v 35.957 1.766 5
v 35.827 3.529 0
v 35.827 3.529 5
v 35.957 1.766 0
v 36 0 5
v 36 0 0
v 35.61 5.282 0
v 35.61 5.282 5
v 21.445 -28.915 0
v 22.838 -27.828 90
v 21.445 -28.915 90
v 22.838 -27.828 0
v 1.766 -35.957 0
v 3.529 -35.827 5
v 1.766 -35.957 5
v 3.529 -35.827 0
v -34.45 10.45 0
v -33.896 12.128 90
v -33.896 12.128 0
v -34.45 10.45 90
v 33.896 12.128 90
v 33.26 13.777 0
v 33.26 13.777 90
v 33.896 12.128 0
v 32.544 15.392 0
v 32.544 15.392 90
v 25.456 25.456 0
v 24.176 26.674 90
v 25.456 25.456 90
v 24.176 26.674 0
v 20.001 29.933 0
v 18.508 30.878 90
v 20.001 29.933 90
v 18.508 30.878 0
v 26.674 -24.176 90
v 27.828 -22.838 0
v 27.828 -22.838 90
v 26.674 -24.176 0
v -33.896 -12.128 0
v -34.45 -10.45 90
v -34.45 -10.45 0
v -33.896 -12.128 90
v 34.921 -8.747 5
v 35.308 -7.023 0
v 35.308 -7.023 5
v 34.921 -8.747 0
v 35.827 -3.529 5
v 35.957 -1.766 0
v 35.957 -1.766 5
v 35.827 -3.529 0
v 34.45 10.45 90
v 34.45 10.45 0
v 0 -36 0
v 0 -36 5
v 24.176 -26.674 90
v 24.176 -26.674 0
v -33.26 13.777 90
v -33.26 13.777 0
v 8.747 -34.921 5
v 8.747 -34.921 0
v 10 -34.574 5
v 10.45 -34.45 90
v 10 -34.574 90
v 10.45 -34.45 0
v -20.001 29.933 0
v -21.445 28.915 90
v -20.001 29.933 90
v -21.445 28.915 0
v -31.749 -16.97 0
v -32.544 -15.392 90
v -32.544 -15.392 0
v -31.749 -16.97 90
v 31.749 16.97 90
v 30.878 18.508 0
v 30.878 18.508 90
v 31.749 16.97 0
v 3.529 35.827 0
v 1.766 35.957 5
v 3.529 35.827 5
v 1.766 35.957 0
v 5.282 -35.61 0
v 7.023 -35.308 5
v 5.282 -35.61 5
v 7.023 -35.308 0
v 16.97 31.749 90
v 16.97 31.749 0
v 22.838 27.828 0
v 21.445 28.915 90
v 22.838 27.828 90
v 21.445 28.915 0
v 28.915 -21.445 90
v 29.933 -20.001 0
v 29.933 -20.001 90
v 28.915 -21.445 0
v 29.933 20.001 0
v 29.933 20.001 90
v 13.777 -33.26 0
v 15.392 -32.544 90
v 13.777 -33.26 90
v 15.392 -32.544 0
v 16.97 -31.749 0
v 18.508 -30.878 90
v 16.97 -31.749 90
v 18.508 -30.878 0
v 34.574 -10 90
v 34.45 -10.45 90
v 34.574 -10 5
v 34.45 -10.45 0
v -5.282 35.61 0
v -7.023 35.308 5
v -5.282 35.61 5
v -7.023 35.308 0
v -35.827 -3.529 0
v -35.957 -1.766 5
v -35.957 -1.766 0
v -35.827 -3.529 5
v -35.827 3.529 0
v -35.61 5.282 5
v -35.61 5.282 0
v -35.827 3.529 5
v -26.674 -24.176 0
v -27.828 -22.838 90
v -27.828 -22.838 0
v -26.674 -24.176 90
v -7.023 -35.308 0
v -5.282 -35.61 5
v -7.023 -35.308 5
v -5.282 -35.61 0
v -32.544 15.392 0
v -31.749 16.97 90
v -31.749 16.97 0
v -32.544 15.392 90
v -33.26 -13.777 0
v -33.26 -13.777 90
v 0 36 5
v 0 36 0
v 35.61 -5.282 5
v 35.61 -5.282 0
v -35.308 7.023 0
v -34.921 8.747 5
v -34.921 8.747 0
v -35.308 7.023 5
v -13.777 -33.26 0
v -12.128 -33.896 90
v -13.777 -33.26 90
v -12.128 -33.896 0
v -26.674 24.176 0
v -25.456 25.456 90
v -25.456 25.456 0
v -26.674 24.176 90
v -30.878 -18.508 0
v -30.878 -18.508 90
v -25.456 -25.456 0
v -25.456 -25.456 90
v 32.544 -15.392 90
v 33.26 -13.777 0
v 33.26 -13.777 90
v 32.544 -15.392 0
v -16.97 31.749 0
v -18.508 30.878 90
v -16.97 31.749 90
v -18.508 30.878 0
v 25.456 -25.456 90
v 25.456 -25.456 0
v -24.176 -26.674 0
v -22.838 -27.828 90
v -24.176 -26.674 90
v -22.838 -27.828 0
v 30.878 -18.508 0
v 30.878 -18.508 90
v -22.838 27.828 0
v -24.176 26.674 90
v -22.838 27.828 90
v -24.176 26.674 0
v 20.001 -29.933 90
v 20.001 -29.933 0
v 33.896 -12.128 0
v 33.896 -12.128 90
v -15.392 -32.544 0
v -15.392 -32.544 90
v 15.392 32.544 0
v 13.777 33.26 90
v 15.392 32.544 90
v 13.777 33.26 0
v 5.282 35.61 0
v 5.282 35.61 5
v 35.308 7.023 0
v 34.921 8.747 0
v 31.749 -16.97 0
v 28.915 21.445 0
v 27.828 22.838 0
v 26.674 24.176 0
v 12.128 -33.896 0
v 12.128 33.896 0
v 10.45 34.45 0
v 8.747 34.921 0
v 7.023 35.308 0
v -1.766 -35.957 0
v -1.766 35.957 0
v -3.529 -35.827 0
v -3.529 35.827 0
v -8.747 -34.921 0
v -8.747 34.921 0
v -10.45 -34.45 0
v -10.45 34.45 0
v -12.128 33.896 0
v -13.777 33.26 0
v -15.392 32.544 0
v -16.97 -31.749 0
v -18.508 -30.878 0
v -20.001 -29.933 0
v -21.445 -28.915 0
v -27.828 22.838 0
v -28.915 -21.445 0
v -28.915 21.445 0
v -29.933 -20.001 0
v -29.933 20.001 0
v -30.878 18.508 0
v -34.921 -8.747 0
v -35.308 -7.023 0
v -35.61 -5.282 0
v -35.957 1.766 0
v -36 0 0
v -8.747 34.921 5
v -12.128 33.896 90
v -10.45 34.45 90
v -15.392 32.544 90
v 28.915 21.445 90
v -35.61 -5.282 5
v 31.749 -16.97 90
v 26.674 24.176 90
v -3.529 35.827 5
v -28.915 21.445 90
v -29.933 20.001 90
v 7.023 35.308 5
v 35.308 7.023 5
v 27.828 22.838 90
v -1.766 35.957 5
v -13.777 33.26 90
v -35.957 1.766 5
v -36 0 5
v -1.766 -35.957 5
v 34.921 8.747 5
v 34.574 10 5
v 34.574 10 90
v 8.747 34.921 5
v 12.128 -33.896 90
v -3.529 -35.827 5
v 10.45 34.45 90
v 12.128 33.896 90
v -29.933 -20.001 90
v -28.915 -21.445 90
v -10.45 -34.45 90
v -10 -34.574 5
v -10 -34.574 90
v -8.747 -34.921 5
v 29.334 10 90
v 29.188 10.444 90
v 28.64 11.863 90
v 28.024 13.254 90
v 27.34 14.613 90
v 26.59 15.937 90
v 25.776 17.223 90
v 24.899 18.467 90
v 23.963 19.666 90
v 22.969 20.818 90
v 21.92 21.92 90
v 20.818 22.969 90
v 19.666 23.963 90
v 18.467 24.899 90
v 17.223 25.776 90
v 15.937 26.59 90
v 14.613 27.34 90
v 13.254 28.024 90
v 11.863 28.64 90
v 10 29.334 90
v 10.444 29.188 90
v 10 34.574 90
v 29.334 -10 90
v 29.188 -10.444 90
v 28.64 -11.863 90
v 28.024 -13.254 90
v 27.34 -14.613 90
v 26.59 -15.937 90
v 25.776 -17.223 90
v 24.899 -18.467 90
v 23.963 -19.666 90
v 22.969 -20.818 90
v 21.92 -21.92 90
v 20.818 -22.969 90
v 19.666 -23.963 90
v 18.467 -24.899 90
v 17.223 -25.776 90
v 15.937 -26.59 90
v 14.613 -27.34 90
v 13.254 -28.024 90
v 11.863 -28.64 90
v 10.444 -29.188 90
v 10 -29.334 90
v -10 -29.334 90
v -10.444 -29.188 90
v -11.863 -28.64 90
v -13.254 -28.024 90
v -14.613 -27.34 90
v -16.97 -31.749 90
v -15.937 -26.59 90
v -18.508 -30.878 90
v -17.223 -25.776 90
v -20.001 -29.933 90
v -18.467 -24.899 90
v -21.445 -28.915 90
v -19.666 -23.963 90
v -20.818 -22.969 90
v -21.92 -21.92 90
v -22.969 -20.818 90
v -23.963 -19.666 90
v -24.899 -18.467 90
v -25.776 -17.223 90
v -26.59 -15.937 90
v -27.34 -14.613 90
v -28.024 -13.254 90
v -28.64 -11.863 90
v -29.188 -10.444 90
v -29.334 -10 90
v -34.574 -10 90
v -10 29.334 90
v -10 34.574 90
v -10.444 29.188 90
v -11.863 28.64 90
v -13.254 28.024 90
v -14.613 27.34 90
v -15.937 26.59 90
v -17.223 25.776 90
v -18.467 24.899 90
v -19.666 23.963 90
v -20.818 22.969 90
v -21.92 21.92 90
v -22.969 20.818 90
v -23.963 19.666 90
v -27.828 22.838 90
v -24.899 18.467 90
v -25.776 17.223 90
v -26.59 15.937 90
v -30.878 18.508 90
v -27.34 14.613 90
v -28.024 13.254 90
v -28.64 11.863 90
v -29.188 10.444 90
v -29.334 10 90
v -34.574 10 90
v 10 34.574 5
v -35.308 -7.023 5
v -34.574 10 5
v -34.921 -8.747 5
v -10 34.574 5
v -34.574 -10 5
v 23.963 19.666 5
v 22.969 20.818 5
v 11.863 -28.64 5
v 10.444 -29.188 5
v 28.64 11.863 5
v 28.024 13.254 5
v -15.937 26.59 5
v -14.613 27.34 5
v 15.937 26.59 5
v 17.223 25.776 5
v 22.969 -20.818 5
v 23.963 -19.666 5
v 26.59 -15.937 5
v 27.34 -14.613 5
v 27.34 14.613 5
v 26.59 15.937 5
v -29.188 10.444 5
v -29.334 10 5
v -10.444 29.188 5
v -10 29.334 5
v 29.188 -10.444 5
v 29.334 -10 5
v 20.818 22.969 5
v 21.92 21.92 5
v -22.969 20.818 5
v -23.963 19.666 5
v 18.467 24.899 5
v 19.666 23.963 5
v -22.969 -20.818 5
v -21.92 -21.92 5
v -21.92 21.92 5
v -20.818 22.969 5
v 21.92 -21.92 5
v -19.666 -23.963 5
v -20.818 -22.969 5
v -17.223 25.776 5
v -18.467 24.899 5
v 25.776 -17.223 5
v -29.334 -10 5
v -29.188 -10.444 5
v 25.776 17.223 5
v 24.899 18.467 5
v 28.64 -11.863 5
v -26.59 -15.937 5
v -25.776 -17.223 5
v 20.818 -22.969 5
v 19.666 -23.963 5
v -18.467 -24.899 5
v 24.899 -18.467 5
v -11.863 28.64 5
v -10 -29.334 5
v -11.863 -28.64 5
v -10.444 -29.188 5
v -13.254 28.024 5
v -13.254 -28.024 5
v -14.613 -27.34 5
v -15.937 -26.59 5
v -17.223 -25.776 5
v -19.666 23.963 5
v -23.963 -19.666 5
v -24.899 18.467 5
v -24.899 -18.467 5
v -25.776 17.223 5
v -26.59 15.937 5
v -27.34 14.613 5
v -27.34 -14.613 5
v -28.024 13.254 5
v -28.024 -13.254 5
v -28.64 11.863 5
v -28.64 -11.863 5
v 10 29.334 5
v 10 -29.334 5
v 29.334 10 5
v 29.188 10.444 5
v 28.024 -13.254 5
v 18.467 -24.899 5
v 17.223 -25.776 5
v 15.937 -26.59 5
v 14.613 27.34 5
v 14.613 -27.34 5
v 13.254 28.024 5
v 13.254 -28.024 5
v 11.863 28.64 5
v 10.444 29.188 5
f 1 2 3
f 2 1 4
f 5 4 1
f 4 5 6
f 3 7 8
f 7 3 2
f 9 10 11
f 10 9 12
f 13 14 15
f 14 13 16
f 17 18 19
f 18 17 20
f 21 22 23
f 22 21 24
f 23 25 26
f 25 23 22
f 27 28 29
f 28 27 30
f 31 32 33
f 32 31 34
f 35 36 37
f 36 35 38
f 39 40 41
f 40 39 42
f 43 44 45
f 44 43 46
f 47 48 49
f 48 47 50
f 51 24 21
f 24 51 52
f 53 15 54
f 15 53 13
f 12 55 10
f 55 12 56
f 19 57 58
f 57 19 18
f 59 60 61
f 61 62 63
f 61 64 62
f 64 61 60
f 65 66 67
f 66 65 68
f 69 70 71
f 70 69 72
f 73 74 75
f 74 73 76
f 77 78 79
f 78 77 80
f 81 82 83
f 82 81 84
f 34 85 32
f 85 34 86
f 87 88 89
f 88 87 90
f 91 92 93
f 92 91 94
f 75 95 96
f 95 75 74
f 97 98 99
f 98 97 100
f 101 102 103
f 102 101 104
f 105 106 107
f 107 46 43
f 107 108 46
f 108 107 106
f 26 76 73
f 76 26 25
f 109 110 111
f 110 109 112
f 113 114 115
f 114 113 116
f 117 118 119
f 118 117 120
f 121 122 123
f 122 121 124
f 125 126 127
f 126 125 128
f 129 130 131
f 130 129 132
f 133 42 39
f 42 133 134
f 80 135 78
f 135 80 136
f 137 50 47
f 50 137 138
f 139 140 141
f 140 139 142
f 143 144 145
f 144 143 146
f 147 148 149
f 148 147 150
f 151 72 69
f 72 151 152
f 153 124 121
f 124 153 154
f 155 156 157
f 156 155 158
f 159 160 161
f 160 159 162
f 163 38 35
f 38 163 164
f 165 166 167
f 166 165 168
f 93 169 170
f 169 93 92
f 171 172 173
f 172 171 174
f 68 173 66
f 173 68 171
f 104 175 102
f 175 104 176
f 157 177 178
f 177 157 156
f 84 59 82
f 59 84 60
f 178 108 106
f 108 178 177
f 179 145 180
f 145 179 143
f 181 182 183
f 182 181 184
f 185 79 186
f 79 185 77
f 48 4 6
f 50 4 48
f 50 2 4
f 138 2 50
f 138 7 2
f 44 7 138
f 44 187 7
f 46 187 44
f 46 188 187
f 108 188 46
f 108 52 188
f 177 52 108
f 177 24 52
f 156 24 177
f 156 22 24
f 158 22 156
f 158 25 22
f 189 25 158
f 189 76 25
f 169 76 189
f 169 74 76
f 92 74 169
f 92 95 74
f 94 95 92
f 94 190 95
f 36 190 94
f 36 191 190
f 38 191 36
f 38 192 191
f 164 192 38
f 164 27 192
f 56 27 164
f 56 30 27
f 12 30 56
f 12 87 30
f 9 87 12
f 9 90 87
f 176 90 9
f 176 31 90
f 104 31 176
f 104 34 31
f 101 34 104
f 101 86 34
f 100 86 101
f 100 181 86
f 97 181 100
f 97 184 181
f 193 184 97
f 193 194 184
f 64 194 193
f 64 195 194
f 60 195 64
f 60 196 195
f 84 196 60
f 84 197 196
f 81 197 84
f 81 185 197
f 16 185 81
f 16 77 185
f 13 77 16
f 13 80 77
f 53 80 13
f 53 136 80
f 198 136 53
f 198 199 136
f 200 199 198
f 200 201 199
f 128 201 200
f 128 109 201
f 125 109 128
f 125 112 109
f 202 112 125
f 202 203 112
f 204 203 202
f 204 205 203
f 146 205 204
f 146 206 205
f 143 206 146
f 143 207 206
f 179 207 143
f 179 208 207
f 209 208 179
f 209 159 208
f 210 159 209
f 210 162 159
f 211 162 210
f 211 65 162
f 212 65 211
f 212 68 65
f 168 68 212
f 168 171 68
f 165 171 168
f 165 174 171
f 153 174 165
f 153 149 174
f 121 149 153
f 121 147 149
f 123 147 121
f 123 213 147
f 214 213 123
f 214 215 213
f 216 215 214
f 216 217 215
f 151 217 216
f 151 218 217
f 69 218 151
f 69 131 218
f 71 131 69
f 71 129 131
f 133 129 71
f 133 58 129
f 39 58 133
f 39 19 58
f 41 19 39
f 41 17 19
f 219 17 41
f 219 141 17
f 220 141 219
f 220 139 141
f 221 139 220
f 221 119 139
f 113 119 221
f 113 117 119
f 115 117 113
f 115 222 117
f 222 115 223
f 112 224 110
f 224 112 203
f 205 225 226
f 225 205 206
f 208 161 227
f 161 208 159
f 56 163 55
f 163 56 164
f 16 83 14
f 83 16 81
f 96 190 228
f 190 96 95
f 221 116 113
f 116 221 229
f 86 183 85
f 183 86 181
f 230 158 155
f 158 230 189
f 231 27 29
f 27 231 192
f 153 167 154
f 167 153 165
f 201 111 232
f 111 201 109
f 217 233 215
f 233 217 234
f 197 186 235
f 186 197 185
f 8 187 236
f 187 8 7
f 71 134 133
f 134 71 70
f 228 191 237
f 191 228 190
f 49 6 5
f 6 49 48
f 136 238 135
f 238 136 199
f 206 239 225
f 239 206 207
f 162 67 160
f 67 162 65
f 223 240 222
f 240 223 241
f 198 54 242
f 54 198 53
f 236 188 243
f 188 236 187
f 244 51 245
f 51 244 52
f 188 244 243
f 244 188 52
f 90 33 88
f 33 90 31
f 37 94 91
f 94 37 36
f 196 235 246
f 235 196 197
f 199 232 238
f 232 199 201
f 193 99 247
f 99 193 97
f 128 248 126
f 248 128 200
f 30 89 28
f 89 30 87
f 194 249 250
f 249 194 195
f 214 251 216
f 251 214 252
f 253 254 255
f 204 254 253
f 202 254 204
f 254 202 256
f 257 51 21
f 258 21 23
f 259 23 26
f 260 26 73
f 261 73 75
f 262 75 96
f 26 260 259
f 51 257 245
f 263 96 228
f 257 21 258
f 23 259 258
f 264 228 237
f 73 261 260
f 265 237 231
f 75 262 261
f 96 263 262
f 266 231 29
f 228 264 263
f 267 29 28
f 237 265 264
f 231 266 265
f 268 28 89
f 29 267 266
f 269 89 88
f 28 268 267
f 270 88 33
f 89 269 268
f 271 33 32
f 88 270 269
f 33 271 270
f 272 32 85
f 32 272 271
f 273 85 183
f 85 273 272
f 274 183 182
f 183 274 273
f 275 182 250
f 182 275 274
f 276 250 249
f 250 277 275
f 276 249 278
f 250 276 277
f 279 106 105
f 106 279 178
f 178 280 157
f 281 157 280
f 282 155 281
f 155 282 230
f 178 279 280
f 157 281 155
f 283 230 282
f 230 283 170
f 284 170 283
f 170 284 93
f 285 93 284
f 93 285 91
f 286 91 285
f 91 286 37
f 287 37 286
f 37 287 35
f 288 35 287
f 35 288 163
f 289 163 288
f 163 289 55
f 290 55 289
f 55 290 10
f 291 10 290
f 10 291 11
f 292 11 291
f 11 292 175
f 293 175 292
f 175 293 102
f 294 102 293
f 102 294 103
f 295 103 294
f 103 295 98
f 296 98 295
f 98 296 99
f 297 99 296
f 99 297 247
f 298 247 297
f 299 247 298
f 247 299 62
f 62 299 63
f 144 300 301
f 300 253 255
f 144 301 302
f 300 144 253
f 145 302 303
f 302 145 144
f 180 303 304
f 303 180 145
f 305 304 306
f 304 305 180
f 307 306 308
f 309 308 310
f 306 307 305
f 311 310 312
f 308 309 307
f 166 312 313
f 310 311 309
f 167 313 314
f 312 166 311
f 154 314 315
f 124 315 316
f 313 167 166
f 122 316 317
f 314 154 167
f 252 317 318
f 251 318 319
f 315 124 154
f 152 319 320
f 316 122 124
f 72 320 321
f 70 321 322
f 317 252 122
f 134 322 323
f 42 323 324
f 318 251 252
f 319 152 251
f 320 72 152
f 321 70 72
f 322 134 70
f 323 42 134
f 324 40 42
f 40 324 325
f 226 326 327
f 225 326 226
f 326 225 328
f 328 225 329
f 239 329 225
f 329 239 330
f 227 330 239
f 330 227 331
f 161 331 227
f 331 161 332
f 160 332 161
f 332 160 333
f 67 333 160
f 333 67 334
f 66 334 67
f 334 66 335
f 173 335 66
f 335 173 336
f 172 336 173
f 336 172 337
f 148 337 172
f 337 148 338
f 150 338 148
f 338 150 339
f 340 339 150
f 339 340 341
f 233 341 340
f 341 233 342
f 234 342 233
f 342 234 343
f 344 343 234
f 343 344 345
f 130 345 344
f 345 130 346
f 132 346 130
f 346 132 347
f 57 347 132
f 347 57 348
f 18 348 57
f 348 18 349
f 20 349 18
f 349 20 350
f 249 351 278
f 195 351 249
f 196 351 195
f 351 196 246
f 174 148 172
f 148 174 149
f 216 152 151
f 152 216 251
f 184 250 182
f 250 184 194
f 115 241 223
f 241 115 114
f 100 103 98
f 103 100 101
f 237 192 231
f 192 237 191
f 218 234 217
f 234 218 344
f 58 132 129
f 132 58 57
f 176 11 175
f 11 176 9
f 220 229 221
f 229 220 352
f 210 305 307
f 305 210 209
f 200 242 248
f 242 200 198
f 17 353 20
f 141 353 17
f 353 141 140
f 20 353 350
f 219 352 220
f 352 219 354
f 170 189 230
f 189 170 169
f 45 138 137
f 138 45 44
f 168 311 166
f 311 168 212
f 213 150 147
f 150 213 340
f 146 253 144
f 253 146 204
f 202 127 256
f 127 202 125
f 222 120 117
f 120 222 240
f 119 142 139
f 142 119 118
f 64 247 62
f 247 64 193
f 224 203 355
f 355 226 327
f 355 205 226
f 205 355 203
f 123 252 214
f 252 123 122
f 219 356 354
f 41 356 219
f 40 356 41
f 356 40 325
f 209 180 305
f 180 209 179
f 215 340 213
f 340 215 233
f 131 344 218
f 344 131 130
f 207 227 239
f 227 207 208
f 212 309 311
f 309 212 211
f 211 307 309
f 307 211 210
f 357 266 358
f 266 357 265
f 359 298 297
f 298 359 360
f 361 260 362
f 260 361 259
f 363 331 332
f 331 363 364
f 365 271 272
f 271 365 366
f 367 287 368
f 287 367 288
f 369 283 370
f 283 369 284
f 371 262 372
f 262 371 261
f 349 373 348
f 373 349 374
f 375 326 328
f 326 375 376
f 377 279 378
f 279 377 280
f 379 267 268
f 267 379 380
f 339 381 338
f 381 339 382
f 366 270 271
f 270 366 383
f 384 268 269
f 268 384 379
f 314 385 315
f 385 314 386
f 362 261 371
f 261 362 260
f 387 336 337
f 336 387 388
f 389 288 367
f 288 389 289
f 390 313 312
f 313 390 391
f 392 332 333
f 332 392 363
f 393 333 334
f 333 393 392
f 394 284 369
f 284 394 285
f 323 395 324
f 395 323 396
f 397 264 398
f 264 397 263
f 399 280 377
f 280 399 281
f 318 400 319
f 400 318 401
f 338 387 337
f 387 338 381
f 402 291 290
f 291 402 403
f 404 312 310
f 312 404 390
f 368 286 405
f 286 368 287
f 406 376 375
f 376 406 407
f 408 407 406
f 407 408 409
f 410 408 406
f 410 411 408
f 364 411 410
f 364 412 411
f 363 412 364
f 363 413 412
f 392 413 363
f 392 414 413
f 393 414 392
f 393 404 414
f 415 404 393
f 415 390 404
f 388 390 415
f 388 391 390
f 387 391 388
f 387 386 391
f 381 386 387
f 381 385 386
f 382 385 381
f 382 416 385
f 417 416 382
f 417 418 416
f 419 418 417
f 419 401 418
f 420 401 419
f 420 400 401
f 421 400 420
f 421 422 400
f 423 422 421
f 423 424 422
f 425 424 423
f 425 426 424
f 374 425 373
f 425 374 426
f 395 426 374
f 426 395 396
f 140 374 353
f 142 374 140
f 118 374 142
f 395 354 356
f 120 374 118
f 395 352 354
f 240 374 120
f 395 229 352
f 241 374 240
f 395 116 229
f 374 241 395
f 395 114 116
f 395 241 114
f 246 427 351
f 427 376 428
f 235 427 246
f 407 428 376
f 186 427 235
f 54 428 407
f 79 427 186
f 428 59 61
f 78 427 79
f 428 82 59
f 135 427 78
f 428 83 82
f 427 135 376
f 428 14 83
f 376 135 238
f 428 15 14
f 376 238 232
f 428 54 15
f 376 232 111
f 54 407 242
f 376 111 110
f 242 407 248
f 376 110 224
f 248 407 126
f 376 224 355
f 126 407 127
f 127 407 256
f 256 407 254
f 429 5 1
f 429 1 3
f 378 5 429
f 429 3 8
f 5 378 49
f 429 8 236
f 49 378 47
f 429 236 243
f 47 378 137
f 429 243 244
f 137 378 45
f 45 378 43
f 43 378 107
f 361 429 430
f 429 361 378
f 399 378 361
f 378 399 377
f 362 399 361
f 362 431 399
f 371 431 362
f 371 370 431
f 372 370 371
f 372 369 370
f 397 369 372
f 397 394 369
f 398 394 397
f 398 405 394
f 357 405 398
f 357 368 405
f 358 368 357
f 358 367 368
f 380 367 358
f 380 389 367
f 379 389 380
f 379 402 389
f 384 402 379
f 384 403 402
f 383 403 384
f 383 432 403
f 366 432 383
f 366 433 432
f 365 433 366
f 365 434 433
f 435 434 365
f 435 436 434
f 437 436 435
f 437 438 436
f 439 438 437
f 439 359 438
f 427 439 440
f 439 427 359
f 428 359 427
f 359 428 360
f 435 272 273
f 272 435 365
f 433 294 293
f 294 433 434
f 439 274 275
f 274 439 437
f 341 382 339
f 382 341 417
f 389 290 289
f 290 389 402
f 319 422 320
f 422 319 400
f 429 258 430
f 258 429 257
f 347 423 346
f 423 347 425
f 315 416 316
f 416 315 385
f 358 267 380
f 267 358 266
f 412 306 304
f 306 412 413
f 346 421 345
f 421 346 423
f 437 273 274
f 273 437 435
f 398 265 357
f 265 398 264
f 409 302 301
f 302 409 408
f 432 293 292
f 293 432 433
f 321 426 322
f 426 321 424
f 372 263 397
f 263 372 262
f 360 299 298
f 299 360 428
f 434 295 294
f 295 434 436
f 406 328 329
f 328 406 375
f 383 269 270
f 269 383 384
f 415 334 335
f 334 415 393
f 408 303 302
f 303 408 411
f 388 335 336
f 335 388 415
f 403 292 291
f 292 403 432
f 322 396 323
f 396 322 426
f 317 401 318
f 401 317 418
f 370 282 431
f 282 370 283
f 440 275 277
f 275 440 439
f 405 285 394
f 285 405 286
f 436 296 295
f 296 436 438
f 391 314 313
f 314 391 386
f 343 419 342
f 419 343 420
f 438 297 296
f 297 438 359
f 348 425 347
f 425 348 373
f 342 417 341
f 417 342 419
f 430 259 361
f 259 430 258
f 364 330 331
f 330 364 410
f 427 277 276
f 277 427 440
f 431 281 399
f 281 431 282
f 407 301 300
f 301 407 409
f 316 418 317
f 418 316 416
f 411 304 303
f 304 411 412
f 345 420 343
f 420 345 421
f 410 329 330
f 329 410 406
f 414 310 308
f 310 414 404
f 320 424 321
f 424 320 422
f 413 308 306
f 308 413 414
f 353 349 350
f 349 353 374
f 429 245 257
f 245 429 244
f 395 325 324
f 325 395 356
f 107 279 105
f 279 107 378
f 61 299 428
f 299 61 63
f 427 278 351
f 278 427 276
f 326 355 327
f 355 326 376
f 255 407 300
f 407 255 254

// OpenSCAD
Dia=62;
Height=90;
$fn=128;
Wall=5;
Buffer=10;
Slot=20;
OuterDia=Dia+(Wall*2);
HB=Height+Buffer;
WB=OuterDia+(Wall*2);
HalfWB=WB/2;
HalfSlot=Slot/2;
difference()
{
  cylinder(h=Height,d=OuterDia);
  translate([0,0,Wall]) cylinder(h=HB,d=Dia);
  translate([-HalfWB,-HalfSlot,Wall]) cube([WB,Slot,HB]);
  translate([-HalfSlot,-HalfWB,Wall]) cube([Slot,WB,HB]);
}
